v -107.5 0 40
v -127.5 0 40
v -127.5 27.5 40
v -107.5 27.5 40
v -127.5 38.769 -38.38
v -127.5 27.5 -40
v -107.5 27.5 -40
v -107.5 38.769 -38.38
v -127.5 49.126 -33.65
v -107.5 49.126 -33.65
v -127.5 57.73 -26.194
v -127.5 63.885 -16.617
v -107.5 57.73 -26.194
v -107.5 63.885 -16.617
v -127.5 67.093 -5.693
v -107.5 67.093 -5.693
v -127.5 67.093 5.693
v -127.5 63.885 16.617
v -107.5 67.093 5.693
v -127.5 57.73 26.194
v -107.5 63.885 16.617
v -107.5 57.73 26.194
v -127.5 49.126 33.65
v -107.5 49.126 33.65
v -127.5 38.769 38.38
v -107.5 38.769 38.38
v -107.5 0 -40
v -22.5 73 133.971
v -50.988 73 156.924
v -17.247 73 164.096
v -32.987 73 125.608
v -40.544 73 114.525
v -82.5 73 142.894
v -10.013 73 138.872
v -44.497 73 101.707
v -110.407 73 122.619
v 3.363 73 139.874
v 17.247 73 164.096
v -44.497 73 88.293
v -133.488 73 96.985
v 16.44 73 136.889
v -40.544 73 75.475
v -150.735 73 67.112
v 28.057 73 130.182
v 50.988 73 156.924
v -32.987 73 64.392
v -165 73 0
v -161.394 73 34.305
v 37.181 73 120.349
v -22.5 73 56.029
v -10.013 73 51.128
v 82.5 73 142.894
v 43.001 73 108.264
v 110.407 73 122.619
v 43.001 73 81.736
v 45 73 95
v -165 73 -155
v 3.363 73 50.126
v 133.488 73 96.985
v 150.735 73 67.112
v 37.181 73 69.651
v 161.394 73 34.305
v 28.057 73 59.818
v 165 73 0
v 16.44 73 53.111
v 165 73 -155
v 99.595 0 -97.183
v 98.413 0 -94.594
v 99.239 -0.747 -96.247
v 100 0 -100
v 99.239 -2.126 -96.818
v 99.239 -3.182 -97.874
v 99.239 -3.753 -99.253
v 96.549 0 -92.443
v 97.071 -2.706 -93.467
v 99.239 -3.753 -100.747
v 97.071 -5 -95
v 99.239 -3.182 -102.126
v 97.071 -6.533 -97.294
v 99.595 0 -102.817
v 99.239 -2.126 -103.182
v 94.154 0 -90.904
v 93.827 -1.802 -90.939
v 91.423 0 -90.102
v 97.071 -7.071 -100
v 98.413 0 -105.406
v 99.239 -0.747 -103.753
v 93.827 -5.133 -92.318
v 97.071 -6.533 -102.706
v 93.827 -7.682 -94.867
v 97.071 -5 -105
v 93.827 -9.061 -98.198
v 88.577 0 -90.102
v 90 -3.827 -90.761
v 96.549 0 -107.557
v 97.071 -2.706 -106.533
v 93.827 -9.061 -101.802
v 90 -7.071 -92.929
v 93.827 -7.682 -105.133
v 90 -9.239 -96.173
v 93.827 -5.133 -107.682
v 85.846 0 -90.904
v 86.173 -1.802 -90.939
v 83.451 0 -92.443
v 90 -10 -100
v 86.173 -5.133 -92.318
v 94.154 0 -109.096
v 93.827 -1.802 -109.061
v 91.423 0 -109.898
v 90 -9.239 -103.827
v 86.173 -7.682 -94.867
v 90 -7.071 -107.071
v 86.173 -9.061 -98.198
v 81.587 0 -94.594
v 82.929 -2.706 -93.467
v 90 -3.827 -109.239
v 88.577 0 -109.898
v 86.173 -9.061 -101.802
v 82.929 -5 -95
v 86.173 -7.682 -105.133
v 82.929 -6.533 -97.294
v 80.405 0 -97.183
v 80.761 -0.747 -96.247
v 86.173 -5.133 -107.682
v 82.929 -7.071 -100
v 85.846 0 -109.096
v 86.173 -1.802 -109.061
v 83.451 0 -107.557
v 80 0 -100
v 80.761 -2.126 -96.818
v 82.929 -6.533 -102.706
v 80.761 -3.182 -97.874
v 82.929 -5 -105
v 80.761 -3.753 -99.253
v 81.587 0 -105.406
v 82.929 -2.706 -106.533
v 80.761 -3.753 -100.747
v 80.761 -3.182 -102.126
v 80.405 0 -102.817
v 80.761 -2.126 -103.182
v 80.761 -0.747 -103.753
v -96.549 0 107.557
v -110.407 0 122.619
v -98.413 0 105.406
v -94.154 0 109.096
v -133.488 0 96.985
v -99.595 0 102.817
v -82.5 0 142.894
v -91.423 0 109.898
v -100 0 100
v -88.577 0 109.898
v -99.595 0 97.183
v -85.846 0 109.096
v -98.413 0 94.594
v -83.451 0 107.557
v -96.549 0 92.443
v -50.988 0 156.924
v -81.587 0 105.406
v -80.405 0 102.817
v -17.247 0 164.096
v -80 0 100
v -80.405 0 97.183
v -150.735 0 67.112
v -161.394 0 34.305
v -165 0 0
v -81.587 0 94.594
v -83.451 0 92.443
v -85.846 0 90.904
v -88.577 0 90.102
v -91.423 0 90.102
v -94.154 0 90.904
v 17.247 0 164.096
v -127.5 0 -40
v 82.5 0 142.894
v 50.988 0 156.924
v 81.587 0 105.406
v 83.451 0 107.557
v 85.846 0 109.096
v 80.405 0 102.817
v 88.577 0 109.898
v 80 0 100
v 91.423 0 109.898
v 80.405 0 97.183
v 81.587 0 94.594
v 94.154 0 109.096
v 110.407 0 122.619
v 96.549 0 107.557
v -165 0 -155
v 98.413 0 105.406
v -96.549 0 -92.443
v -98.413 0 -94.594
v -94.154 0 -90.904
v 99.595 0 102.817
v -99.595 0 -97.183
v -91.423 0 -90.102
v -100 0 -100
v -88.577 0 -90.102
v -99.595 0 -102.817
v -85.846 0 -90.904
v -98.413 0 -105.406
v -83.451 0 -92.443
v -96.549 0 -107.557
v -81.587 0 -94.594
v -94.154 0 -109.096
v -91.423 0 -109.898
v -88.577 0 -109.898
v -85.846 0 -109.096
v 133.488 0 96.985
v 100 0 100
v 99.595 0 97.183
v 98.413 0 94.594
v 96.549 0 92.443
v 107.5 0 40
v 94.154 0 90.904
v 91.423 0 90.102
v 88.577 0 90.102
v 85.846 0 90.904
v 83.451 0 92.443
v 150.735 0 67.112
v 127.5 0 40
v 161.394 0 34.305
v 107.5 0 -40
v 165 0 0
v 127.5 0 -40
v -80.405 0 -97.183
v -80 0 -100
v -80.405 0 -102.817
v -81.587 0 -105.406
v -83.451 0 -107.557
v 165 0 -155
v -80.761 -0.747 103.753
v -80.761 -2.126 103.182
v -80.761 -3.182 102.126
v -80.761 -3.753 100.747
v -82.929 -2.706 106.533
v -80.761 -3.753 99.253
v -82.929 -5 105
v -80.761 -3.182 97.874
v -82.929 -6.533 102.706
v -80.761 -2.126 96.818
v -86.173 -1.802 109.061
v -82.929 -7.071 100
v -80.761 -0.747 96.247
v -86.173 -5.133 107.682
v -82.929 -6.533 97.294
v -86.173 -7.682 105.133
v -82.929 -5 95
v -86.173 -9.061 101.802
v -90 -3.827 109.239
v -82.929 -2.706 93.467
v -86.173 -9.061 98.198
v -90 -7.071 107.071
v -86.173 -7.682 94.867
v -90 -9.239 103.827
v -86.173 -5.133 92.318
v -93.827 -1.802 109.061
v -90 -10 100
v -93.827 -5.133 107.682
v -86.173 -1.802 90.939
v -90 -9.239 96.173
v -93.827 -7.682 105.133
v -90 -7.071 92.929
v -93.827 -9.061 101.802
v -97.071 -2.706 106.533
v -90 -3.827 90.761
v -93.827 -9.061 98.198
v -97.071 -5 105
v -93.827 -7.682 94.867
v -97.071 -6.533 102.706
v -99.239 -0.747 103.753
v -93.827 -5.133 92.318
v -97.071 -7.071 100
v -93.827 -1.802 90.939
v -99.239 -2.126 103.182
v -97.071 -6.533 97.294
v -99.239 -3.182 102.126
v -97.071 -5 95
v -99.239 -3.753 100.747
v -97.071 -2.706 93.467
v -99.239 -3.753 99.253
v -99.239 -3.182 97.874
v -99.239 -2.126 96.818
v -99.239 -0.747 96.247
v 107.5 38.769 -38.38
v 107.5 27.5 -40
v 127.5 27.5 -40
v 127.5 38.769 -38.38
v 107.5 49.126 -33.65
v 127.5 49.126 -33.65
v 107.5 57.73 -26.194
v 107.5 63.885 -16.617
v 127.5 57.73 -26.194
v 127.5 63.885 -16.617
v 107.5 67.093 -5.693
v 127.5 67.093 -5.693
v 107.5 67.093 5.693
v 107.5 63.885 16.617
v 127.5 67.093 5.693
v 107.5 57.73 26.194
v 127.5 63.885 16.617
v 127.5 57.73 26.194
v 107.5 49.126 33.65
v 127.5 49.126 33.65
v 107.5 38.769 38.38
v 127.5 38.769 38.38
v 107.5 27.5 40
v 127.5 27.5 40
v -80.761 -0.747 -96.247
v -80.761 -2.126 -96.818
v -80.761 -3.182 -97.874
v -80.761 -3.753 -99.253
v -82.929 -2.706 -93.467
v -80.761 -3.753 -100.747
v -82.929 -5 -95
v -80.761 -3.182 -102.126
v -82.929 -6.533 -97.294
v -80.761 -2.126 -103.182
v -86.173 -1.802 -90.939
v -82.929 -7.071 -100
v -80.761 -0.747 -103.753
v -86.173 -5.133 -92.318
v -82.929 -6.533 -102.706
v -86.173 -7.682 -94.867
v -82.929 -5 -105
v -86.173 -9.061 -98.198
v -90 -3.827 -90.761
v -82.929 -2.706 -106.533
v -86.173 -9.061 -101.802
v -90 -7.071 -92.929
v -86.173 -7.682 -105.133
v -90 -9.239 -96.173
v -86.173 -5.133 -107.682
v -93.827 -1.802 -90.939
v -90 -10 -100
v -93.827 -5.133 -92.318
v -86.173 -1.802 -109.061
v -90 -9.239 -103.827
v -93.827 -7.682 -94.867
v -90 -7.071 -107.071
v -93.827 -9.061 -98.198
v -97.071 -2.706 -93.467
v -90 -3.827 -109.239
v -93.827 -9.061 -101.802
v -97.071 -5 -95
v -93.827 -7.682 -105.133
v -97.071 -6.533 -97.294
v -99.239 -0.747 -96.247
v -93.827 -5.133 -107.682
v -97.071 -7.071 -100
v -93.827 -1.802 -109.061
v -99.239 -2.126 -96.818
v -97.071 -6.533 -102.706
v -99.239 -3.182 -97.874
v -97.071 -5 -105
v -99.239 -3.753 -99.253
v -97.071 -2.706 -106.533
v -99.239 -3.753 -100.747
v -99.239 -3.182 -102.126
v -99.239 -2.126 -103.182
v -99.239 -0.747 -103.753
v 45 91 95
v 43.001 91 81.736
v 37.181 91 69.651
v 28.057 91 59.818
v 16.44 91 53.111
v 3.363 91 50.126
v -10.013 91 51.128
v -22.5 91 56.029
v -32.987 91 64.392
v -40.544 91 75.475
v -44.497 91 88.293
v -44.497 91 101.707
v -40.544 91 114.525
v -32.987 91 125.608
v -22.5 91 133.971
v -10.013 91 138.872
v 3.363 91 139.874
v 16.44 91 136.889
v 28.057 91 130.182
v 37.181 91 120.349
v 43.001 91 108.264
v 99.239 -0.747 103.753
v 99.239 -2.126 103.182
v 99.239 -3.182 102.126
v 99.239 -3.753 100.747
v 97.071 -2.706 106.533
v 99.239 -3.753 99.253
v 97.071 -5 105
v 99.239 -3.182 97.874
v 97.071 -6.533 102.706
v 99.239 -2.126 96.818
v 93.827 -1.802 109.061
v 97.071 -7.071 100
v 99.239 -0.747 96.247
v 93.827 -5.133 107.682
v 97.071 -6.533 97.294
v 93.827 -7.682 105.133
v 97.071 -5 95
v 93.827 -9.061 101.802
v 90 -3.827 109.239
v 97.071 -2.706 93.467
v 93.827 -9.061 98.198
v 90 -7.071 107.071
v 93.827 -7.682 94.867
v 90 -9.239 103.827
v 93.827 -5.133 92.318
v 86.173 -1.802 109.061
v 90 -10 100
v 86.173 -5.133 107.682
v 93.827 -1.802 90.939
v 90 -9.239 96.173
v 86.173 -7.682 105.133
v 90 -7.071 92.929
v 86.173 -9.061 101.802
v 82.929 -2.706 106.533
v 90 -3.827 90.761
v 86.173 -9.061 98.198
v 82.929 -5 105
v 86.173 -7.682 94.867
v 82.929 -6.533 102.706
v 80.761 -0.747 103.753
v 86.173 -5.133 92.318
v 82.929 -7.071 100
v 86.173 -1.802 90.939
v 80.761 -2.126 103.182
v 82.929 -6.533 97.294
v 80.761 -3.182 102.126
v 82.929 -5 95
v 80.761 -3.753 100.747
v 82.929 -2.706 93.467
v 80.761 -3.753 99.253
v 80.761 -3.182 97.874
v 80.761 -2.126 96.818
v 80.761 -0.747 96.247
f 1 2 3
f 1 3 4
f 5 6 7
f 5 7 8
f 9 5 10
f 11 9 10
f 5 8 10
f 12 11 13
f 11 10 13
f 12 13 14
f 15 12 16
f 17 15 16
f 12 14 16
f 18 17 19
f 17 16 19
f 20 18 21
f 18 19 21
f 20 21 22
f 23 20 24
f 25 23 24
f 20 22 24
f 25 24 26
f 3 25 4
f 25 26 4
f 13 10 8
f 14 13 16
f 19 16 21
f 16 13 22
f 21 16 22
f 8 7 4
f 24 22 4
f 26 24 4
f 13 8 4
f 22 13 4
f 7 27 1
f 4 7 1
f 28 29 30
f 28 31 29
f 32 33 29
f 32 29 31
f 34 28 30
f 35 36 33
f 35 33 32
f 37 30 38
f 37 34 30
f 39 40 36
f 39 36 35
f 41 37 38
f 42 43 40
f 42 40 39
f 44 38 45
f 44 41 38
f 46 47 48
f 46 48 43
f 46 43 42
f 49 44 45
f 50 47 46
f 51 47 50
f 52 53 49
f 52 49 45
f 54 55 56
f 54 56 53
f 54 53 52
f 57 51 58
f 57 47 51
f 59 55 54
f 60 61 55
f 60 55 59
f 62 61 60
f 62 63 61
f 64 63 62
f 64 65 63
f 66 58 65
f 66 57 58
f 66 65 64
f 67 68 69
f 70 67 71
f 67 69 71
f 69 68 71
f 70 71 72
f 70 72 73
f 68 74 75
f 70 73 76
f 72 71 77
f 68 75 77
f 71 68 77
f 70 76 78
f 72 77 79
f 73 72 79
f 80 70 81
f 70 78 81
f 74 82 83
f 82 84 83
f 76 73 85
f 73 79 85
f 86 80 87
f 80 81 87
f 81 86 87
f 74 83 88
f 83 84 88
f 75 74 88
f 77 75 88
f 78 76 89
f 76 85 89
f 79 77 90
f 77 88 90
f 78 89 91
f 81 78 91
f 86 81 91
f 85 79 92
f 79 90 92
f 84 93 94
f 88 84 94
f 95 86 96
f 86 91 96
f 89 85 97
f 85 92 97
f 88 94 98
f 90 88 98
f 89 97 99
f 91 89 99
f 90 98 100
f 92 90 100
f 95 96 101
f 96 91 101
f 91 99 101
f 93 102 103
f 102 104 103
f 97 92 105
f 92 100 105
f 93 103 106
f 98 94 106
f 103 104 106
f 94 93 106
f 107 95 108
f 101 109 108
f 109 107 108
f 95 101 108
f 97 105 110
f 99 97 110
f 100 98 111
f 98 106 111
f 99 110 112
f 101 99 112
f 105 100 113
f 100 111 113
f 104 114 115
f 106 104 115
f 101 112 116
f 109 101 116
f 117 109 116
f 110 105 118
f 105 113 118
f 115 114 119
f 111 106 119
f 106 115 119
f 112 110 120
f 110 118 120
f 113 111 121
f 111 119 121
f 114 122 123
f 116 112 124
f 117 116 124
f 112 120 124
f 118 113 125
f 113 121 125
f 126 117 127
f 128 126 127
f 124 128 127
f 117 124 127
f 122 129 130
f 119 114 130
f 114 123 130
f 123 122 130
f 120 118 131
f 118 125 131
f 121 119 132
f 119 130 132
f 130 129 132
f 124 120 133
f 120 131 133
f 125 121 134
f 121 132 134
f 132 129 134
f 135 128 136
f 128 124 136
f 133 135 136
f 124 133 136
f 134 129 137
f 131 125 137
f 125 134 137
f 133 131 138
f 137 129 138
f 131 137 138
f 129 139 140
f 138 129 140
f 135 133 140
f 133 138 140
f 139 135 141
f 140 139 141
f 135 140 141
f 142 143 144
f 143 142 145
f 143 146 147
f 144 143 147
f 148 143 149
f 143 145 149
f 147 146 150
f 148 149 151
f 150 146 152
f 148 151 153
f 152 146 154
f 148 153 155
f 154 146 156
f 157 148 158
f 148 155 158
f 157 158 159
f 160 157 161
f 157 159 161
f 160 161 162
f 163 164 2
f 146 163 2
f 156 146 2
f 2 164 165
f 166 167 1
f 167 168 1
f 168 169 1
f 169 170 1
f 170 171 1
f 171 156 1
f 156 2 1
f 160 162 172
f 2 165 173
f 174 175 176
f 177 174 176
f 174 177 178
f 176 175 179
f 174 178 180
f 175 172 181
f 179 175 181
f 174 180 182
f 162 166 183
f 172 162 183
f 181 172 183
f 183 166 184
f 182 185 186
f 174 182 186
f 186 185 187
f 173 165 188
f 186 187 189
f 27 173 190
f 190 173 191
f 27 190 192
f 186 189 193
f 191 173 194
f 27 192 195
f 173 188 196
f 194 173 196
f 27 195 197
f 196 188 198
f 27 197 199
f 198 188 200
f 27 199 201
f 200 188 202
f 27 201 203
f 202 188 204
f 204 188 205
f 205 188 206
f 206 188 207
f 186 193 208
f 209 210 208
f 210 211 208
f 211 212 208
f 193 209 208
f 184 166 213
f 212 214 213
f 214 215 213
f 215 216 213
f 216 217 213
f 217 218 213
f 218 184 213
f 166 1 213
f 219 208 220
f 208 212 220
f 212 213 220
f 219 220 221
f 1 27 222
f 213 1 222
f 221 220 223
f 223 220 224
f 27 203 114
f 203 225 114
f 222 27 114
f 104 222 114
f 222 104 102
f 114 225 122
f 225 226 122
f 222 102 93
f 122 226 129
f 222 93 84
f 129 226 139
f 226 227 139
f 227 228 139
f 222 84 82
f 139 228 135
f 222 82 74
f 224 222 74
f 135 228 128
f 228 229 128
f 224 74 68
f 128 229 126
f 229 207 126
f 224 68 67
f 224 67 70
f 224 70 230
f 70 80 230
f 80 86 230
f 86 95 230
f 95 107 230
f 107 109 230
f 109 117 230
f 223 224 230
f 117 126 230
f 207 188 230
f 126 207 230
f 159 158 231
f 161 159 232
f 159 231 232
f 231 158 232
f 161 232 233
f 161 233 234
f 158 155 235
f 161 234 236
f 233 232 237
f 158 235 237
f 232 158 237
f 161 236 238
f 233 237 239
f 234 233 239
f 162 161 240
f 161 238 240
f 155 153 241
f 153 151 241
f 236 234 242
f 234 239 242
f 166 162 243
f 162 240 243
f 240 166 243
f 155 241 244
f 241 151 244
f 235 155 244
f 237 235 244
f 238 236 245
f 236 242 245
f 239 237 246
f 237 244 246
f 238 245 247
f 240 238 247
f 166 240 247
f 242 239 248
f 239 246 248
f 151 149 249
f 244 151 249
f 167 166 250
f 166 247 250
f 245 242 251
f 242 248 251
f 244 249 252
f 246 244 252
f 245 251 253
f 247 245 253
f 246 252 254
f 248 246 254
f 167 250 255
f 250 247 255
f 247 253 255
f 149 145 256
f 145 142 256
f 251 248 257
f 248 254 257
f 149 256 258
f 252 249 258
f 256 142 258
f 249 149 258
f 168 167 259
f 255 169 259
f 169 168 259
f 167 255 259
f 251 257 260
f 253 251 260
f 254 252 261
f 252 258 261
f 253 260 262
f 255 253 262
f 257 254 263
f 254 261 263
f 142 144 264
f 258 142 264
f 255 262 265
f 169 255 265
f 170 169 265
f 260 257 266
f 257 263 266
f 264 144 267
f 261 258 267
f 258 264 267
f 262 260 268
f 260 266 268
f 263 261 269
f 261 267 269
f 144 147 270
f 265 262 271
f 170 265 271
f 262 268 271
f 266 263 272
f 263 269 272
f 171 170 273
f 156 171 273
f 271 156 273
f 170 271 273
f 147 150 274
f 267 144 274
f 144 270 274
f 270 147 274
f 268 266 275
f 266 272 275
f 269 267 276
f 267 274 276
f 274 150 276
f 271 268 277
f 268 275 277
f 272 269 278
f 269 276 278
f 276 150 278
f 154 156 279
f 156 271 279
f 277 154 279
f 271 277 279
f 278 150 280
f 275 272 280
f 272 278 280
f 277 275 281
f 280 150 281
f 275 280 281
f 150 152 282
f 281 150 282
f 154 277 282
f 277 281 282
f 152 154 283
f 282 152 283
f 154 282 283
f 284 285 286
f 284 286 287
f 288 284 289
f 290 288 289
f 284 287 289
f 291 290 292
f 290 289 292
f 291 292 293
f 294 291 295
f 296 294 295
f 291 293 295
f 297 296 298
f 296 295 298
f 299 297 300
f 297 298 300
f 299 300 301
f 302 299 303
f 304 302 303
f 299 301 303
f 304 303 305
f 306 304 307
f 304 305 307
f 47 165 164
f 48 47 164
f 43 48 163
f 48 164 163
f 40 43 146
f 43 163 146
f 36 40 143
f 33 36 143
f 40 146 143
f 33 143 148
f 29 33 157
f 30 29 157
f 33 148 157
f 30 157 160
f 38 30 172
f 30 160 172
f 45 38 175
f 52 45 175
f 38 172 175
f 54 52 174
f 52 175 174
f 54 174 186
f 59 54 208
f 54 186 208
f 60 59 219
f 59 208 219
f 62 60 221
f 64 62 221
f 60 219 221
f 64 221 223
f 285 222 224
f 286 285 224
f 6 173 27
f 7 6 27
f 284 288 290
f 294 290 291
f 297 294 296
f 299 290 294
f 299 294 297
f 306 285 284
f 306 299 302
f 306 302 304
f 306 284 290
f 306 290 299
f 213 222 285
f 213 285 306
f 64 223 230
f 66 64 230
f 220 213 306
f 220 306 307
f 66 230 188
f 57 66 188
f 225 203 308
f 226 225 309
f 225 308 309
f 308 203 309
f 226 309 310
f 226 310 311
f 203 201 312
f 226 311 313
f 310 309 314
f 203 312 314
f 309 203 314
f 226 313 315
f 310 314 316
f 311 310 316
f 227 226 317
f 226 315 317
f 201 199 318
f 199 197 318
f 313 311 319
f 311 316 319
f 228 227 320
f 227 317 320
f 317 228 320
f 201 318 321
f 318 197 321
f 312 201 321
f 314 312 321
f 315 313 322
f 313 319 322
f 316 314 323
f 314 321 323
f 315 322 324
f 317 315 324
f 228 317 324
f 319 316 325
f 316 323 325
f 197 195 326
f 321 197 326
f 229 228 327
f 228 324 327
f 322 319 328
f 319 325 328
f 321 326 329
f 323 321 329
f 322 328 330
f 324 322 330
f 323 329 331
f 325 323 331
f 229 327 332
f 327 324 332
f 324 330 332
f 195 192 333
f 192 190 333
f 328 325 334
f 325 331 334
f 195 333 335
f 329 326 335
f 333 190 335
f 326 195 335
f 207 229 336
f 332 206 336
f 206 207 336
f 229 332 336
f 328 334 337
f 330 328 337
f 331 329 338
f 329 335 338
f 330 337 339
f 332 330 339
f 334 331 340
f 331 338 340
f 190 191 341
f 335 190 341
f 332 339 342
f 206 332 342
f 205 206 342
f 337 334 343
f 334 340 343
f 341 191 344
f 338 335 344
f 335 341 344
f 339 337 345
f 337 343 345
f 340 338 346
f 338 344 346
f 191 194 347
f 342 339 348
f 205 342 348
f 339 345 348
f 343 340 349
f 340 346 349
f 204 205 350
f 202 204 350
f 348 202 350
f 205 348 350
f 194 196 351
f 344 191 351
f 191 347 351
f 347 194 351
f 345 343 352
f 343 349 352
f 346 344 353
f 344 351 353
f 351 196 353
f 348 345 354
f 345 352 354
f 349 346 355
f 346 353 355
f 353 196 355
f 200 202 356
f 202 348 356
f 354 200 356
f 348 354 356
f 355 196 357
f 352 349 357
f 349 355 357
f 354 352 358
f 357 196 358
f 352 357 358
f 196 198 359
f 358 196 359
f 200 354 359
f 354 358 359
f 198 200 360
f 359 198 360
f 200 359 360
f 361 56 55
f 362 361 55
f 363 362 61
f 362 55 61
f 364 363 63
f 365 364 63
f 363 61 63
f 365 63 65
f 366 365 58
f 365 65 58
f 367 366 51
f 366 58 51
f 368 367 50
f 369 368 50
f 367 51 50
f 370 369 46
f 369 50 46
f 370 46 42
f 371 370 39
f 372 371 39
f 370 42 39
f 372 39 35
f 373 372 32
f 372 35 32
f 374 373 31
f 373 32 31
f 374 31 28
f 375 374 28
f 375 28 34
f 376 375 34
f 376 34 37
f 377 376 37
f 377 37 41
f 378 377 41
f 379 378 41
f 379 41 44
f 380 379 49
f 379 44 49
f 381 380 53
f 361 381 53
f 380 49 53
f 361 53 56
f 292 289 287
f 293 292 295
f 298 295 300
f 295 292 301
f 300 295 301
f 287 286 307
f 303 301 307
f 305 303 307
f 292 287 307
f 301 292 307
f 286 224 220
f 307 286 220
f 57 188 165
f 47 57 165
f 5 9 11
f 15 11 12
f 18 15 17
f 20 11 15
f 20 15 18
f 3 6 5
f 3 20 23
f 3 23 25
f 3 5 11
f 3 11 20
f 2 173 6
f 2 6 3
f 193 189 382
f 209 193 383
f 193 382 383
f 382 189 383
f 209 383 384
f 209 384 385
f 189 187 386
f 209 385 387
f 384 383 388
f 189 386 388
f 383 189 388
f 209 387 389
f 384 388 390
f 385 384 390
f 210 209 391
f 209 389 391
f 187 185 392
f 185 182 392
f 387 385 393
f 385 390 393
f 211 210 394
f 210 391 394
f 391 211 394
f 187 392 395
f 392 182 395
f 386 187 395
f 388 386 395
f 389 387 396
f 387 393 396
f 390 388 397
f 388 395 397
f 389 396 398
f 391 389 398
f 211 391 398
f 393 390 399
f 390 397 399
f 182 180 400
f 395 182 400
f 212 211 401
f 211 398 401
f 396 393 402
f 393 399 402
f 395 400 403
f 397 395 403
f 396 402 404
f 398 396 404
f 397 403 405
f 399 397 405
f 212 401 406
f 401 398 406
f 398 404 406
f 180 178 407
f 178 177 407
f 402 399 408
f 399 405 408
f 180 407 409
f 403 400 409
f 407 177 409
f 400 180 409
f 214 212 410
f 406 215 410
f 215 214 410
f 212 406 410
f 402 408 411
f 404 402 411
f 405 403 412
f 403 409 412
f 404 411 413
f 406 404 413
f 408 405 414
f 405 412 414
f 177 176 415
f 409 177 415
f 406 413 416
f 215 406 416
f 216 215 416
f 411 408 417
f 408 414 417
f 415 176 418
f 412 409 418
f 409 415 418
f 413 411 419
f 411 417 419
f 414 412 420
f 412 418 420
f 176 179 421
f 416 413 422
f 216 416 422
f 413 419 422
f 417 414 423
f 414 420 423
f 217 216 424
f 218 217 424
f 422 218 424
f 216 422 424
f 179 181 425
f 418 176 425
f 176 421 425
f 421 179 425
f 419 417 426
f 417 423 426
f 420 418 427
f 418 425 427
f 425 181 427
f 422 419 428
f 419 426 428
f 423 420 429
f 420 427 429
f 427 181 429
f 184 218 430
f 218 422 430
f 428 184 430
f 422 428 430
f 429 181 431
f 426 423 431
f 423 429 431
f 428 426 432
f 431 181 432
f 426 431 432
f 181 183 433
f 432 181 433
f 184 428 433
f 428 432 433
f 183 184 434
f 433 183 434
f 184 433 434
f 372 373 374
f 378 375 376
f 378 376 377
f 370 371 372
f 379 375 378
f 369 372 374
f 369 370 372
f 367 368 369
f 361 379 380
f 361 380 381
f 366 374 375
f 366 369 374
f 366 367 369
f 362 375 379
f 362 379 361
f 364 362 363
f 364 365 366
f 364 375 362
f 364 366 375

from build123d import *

# Parameters (mm, degrees)
BOSS_EXTRUDE1_DEPTH  = 73
SKETCH2_R            = 45
BOSS_EXTRUDE2_DEPTH  = 18
SKETCH3_W            = 20
SKETCH3_H            = 80
CUT_EXTRUDE2_DEPTH   = 27.5
SKETCH5_W            = 20
SKETCH5_H            = 40
LPATTERN2_COUNT      = 2
LPATTERN2_PITCH      = 180
LPATTERN2_COUNT_DIR2 = 2
LPATTERN2_PITCH_DIR2 = 200


with BuildPart() as part:
    # Sketch1 → Boss-Extrude1 (new body)
    with BuildSketch(Plane(origin=(0, 0, 0), x_dir=(1, 0, 0), z_dir=(0, 1, 0))):
        with BuildLine():
            ThreePointArc((-56.568542495, 155), (-135.201348942, 94.581156919), (-165, 0))
            ThreePointArc((-165, 0), (0, -165), (165, 0))
            ThreePointArc((165, 0), (135.201348942, 94.581156919), (56.568542495, 155))
            Line((56.568542495, 155), (-56.568542495, 155))
        make_face()
        with BuildLine():
            Line((-165, 155), (-165, 0))
            ThreePointArc((-165, 0), (-135.201348942, 94.581156919), (-56.568542495, 155))
            Line((-56.568542495, 155), (-165, 155))
        make_face()
        with BuildLine():
            ThreePointArc((56.568542495, 155), (135.201348942, 94.581156919), (165, 0))
            Line((165, 0), (165, 155))
            Line((165, 155), (56.568542495, 155))
        make_face()
    extrude(amount=BOSS_EXTRUDE1_DEPTH)

    # Sketch2 → Boss-Extrude2 (add)
    with BuildSketch(Plane(origin=(0, 73, 0), x_dir=(1, 0, 0), z_dir=(0, 1, 0))):
        with Locations((0, -95)):
            Circle(SKETCH2_R)
    extrude(amount=BOSS_EXTRUDE2_DEPTH)

    # Sketch4 one side → Revolve1 (revolve)
    with BuildSketch(Plane.XZ):
        with BuildLine():
            Line((-100, 100), (-80, 100))
            ThreePointArc((-80, 100), (-90, 110), (-100, 100))
        make_face()
    revolve1 = revolve(axis=Axis((-100, 0, 100), (1, 0, 0)))

    # Sketch3 → Cut-Extrude2 (cut)
    with BuildSketch(Plane.XZ):
        with Locations((-117.5, 0)):
            Rectangle(SKETCH3_W, SKETCH3_H)
        with Locations((117.5, 0)):
            Rectangle(SKETCH3_W, SKETCH3_H)
    extrude(amount=-CUT_EXTRUDE2_DEPTH, mode=Mode.SUBTRACT)

    # Sketch5 → Cut-Revolve2 (revolve, cut)
    with BuildSketch(Plane.XZ.offset(-27.5)):
        with Locations((-117.5, 20)):
            Rectangle(SKETCH5_W, SKETCH5_H)
        with Locations((117.5, 20)):
            Rectangle(SKETCH5_W, SKETCH5_H)
    revolve(axis=Axis((-127.5, 27.5, 0), (1, 0, 0)), mode=Mode.SUBTRACT)

    # LPattern2: Revolve1 2 × 2
    with Locations(*[(i * LPATTERN2_PITCH, 0, -j * LPATTERN2_PITCH_DIR2) for i in range(LPATTERN2_COUNT) for j in range(LPATTERN2_COUNT_DIR2) if (i, j) != (0, 0)]):
        add(revolve1)


solid = part.part
